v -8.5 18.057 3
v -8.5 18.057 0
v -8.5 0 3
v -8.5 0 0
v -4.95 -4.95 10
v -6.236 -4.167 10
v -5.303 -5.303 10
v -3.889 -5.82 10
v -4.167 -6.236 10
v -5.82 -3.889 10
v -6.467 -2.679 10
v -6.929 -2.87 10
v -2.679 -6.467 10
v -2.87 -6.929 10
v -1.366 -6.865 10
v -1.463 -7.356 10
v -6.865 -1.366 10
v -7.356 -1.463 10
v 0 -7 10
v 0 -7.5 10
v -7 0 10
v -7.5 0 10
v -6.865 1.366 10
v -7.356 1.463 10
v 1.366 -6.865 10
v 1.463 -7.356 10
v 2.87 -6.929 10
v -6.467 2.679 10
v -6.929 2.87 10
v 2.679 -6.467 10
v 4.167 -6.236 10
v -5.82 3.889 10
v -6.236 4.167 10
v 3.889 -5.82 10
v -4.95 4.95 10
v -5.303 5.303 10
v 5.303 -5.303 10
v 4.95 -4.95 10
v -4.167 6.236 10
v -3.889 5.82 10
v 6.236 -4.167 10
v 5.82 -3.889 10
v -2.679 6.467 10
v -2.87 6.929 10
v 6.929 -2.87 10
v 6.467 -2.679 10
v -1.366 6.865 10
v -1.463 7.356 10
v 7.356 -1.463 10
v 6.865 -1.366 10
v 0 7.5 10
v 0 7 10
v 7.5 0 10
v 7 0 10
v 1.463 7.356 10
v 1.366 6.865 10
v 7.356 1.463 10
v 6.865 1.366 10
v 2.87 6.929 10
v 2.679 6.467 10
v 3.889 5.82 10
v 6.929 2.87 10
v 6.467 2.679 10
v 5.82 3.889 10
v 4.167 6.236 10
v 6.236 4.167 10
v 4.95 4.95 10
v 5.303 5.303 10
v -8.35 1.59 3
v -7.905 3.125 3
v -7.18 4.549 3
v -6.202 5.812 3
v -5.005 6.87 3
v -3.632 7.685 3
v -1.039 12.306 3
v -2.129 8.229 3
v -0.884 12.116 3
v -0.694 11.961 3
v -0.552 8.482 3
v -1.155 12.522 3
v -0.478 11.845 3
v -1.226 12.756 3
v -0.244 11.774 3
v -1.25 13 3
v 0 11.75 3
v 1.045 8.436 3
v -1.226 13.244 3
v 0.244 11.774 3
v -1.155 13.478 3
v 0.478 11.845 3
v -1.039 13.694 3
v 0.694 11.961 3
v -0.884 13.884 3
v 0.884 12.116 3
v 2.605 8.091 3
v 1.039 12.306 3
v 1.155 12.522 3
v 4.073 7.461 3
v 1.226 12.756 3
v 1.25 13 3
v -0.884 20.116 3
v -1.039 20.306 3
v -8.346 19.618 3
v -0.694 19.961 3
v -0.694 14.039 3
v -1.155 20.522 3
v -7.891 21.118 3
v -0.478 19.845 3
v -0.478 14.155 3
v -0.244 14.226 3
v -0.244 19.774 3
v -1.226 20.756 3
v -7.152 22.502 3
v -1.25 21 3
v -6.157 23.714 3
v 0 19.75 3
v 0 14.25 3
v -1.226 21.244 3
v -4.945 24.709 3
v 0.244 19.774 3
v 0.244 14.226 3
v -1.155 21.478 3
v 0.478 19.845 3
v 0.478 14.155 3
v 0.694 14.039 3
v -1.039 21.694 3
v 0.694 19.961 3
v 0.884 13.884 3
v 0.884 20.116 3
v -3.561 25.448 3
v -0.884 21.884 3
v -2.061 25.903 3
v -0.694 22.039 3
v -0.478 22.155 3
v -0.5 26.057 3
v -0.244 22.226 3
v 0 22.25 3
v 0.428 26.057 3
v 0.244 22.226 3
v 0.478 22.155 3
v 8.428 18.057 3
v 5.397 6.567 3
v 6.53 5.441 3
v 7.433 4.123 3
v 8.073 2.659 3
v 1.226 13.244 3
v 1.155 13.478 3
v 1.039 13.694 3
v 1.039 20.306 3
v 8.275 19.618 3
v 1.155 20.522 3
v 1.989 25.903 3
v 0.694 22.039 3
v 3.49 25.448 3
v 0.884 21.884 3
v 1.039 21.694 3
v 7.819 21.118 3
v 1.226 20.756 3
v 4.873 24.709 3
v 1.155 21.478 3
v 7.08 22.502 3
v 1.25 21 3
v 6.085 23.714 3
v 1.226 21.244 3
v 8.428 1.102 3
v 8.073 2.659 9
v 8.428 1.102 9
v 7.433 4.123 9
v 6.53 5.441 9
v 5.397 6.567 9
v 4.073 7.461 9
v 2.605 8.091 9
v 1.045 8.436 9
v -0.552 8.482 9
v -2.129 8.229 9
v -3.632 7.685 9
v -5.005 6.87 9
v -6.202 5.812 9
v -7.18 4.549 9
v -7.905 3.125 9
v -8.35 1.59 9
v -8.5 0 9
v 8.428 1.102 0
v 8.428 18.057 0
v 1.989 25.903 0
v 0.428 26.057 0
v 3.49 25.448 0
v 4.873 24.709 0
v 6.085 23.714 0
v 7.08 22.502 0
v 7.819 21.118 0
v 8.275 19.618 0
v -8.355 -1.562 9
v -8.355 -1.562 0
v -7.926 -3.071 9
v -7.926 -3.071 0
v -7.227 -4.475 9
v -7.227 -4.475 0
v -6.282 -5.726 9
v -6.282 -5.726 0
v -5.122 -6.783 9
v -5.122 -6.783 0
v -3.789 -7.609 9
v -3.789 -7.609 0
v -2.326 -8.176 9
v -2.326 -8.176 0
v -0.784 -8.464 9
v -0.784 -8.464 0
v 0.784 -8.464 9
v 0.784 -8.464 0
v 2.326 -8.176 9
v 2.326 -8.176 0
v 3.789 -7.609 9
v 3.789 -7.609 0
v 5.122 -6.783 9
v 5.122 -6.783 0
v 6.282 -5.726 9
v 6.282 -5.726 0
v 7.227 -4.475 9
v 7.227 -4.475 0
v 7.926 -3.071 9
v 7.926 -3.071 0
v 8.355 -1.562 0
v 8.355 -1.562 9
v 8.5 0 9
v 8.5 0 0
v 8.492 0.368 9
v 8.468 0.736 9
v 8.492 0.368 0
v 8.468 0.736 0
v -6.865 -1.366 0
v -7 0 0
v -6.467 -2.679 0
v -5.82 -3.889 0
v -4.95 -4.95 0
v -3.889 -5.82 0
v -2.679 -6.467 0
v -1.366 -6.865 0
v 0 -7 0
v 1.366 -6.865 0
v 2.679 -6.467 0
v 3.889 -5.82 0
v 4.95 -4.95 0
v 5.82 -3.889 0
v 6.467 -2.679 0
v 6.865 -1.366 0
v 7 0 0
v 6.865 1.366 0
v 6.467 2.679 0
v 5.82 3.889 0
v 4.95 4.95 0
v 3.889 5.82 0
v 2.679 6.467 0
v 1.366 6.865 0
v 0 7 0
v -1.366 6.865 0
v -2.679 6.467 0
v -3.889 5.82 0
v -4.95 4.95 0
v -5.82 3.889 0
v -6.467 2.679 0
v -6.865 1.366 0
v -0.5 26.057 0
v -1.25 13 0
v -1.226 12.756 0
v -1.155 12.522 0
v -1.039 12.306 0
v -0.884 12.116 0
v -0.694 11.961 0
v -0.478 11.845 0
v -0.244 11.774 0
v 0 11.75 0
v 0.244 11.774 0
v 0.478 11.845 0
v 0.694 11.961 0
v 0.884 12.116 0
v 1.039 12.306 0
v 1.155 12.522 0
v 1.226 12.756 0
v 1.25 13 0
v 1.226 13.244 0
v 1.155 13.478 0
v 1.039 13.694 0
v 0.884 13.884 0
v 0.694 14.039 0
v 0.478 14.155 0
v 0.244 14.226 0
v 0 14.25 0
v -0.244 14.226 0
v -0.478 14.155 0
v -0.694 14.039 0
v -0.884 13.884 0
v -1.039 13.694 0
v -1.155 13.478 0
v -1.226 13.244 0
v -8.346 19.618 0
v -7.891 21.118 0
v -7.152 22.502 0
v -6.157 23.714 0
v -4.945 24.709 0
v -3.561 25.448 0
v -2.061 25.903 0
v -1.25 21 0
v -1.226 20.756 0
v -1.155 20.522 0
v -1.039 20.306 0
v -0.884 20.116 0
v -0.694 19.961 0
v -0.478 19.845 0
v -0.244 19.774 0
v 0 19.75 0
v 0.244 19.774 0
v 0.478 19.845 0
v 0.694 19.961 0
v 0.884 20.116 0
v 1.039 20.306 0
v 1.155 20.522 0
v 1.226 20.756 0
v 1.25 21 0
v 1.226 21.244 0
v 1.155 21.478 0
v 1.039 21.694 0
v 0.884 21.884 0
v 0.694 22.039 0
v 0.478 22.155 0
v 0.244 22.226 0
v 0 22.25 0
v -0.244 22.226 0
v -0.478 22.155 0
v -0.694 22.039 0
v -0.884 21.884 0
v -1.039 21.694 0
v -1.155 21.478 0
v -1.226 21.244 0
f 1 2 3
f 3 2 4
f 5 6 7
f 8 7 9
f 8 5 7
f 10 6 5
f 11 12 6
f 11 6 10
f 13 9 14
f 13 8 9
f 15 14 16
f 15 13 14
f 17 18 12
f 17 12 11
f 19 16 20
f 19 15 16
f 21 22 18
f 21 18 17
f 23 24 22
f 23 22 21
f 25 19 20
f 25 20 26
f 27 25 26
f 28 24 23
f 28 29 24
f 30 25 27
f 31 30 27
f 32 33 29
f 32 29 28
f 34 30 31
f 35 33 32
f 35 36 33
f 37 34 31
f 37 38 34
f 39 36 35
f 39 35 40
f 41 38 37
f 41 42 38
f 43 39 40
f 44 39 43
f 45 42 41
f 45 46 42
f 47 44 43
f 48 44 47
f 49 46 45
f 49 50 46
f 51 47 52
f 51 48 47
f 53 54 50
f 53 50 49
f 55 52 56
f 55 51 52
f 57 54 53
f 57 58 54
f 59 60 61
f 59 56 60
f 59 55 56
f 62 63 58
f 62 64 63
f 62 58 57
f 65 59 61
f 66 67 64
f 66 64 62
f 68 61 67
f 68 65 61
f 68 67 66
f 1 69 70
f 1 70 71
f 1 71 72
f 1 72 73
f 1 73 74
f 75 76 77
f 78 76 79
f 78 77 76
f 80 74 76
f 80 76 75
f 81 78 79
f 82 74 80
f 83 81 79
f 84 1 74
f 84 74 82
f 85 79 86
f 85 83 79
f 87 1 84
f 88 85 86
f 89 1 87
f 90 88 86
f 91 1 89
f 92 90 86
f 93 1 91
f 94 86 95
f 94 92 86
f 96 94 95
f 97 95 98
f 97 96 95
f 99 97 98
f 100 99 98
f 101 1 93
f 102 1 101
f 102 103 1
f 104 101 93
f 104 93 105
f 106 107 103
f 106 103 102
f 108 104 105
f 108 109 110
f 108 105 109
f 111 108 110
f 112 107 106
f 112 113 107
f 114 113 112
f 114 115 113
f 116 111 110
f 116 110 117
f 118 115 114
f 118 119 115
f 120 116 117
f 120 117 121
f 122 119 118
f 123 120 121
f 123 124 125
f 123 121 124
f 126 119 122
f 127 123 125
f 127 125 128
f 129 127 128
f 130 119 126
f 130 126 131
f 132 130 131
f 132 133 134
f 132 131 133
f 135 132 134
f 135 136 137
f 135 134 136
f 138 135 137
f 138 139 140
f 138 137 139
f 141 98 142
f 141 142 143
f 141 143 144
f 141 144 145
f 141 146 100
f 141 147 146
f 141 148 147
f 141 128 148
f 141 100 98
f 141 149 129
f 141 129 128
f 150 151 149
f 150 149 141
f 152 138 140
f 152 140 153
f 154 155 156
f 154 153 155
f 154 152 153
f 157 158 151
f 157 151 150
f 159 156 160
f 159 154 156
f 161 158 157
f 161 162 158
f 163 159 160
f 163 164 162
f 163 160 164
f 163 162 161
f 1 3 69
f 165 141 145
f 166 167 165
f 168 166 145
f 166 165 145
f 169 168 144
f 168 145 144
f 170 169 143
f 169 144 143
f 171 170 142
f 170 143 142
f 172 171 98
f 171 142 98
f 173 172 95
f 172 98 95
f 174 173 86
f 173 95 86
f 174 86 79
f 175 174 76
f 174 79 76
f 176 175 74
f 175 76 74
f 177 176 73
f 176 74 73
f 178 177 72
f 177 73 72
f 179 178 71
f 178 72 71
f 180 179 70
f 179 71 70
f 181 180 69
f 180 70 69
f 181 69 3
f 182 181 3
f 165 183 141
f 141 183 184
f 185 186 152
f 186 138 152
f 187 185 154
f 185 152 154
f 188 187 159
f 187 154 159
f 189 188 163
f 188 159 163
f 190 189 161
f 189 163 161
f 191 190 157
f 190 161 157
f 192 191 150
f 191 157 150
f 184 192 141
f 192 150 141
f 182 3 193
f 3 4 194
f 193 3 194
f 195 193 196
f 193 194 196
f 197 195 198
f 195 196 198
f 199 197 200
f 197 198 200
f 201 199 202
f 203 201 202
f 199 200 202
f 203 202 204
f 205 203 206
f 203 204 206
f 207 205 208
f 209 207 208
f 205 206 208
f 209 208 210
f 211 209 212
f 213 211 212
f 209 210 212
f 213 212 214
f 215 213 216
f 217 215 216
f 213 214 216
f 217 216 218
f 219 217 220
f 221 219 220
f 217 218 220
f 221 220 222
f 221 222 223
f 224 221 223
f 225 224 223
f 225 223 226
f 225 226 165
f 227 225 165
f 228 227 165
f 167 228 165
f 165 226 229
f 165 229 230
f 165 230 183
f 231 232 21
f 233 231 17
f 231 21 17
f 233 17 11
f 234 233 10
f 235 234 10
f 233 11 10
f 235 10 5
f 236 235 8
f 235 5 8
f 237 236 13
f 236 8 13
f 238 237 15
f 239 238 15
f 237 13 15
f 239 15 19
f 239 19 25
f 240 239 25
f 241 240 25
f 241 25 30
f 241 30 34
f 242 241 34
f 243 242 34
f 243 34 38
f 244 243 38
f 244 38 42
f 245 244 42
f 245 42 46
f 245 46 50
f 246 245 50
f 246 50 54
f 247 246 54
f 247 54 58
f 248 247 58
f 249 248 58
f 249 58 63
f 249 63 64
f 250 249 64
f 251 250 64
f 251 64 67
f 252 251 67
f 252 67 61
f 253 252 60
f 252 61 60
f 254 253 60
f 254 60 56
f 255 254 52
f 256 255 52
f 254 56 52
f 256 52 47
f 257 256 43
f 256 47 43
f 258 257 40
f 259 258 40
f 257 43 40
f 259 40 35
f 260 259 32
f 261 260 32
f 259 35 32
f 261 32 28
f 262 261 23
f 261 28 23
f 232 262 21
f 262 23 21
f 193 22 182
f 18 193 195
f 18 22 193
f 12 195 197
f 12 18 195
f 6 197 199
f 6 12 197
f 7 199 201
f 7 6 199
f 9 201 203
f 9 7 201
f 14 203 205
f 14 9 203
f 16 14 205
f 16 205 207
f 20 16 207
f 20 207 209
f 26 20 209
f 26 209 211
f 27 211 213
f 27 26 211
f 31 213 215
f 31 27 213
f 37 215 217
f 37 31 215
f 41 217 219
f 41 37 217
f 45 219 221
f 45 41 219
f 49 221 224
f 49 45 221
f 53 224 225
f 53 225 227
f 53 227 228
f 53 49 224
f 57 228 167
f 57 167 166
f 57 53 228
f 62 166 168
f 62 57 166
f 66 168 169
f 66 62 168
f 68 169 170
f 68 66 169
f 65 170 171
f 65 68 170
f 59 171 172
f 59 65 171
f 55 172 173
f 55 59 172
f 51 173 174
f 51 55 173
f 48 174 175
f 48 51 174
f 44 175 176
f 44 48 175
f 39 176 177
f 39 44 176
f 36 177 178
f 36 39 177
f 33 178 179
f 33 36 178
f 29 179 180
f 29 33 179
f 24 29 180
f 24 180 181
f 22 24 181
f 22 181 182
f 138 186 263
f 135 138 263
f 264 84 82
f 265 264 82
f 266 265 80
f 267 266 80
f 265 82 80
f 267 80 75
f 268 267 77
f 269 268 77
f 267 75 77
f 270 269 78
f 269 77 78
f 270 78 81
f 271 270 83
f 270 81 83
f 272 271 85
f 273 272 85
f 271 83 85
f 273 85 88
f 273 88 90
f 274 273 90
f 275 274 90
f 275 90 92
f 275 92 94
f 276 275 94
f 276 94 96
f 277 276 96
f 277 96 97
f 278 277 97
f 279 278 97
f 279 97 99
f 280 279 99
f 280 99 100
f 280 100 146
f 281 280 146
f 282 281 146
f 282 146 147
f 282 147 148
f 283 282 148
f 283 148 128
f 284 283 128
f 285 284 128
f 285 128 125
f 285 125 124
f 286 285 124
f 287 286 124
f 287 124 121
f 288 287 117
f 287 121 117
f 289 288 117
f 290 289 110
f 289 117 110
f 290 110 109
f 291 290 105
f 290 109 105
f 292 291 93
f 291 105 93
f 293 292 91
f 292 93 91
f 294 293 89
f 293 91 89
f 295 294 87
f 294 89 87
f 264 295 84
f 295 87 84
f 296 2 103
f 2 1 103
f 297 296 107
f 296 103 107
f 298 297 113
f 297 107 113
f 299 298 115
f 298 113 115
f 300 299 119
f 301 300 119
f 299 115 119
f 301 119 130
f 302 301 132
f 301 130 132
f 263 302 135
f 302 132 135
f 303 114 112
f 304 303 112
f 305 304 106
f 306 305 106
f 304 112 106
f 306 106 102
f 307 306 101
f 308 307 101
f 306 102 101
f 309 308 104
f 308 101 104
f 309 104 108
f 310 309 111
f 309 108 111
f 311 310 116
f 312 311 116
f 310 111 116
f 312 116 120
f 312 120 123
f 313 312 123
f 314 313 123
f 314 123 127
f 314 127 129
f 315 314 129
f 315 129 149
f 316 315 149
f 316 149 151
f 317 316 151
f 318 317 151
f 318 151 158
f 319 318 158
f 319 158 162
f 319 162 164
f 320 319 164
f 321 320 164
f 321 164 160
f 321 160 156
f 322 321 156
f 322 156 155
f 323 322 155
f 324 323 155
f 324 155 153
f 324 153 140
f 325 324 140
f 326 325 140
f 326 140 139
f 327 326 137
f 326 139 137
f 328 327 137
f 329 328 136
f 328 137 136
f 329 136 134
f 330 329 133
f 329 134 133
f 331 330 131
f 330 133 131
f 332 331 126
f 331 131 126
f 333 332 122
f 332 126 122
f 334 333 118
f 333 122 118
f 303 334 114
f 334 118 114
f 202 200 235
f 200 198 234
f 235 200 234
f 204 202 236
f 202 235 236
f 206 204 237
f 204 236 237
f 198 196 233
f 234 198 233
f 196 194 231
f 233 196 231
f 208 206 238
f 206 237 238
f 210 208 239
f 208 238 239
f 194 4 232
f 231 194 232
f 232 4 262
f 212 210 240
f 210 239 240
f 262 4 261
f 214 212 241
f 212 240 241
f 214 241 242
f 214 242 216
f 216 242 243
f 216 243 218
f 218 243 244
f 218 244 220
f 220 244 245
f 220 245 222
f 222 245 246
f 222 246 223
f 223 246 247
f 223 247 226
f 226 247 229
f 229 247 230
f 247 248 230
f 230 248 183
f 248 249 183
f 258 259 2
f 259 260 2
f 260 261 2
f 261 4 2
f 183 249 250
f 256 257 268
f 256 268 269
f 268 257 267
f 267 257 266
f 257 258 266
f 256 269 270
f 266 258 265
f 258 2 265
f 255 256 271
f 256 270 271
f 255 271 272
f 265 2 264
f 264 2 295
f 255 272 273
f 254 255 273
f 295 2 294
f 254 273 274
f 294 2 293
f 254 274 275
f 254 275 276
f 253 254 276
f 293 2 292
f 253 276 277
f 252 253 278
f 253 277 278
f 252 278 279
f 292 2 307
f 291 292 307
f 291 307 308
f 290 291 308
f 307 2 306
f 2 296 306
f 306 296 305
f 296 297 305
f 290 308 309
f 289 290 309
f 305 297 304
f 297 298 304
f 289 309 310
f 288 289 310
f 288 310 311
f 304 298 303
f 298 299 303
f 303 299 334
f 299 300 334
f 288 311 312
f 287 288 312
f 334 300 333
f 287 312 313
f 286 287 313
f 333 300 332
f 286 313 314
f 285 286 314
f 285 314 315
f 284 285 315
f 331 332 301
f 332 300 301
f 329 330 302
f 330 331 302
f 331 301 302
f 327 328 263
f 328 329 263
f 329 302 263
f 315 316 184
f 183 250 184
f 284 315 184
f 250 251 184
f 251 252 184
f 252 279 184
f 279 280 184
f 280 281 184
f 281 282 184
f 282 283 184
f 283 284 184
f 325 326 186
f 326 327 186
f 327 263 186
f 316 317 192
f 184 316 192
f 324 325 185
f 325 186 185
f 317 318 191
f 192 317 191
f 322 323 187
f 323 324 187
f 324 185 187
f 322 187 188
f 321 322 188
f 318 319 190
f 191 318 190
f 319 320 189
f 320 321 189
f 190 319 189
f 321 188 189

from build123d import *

# Parameters (mm, degrees)
F1_DEPTH = 10
F2_DEPTH = 3
F3_R     = 8
F4_D     = 14
F6_D     = 2.5


# Not quite as in the source:
# - a fillet or chamfer that OpenCascade refuses, or shapes differently, is made with other operations: its cross-section is extruded or revolved along the edge and cut away or added


with BuildPart() as f1:
    # F0 (on Top) → F1 (new body)
    with BuildSketch(Plane.XY):
        with BuildLine():
            ThreePointArc((8.4283100441, 1.101630519), (-0.5519803552, 8.482058576), (-8.5, 0))
            Line((-8.5, 0), (8.4283100441, 0))
            Line((8.4283100441, 0), (8.4283100441, 1.101630519))
        make_face()
        with BuildLine():
            Line((8.4283100441, 0), (-8.5, 0))
            ThreePointArc((-8.5, 0), (0, -8.5), (8.5, 0))
            ThreePointArc((8.5, 0), (8.482058576, 0.5519803552), (8.4283100441, 1.101630519))
            Line((8.4283100441, 1.101630519), (8.4283100441, 0))
        make_face()
    extrude(amount=F1_DEPTH)

    # F0 (on Top) → F2 (join)
    with BuildSketch(Plane.XY):
        with BuildLine():
            Line((-8.5, 26.0569844395), (-8.5, 0))
            ThreePointArc((-8.5, 0), (-0.5519803552, 8.482058576), (8.4283100441, 1.101630519))
            Line((8.4283100441, 1.101630519), (8.4283100441, 26.0569844395))
            Line((8.4283100441, 26.0569844395), (-8.5, 26.0569844395))
        make_face()
    extrude(amount=F2_DEPTH)

    # F3
    f3_edges = [f1.edges().sort_by_distance(p)[0] for p in [
        (-8.5, 26.056984, 1.5),
        (8.42831, 26.056984, 1.5),
    ]]
    fillet(f3_edges, radius=F3_R)

    # F4 (through all)
    with Locations(Plane(origin=(0, 0, 0), x_dir=(1, 0, 0), z_dir=(0, 0, -1))):
        with Locations((0, 0)):
            Hole(F4_D / 2)

    # F5: chamfer of 1 on 1 edges, made by hand

    # F5_s1 → F5_t2 (revolve, cut)
    with BuildSketch(Plane.XZ):
        Polygon((-8.5, 9), (-7.5, 10), (-8.5, 10), align=None)
    revolve(axis=Axis((0, 0, 10), (0, 0, 1)), mode=Mode.SUBTRACT)

    # F6 (through all)
    with Locations(Plane(origin=(0, 0, 0), x_dir=(1, 0, 0), z_dir=(0, 0, -1))):
        with Locations((0, -21), (0, -13)):
            Hole(F6_D / 2)


solid = f1.part
